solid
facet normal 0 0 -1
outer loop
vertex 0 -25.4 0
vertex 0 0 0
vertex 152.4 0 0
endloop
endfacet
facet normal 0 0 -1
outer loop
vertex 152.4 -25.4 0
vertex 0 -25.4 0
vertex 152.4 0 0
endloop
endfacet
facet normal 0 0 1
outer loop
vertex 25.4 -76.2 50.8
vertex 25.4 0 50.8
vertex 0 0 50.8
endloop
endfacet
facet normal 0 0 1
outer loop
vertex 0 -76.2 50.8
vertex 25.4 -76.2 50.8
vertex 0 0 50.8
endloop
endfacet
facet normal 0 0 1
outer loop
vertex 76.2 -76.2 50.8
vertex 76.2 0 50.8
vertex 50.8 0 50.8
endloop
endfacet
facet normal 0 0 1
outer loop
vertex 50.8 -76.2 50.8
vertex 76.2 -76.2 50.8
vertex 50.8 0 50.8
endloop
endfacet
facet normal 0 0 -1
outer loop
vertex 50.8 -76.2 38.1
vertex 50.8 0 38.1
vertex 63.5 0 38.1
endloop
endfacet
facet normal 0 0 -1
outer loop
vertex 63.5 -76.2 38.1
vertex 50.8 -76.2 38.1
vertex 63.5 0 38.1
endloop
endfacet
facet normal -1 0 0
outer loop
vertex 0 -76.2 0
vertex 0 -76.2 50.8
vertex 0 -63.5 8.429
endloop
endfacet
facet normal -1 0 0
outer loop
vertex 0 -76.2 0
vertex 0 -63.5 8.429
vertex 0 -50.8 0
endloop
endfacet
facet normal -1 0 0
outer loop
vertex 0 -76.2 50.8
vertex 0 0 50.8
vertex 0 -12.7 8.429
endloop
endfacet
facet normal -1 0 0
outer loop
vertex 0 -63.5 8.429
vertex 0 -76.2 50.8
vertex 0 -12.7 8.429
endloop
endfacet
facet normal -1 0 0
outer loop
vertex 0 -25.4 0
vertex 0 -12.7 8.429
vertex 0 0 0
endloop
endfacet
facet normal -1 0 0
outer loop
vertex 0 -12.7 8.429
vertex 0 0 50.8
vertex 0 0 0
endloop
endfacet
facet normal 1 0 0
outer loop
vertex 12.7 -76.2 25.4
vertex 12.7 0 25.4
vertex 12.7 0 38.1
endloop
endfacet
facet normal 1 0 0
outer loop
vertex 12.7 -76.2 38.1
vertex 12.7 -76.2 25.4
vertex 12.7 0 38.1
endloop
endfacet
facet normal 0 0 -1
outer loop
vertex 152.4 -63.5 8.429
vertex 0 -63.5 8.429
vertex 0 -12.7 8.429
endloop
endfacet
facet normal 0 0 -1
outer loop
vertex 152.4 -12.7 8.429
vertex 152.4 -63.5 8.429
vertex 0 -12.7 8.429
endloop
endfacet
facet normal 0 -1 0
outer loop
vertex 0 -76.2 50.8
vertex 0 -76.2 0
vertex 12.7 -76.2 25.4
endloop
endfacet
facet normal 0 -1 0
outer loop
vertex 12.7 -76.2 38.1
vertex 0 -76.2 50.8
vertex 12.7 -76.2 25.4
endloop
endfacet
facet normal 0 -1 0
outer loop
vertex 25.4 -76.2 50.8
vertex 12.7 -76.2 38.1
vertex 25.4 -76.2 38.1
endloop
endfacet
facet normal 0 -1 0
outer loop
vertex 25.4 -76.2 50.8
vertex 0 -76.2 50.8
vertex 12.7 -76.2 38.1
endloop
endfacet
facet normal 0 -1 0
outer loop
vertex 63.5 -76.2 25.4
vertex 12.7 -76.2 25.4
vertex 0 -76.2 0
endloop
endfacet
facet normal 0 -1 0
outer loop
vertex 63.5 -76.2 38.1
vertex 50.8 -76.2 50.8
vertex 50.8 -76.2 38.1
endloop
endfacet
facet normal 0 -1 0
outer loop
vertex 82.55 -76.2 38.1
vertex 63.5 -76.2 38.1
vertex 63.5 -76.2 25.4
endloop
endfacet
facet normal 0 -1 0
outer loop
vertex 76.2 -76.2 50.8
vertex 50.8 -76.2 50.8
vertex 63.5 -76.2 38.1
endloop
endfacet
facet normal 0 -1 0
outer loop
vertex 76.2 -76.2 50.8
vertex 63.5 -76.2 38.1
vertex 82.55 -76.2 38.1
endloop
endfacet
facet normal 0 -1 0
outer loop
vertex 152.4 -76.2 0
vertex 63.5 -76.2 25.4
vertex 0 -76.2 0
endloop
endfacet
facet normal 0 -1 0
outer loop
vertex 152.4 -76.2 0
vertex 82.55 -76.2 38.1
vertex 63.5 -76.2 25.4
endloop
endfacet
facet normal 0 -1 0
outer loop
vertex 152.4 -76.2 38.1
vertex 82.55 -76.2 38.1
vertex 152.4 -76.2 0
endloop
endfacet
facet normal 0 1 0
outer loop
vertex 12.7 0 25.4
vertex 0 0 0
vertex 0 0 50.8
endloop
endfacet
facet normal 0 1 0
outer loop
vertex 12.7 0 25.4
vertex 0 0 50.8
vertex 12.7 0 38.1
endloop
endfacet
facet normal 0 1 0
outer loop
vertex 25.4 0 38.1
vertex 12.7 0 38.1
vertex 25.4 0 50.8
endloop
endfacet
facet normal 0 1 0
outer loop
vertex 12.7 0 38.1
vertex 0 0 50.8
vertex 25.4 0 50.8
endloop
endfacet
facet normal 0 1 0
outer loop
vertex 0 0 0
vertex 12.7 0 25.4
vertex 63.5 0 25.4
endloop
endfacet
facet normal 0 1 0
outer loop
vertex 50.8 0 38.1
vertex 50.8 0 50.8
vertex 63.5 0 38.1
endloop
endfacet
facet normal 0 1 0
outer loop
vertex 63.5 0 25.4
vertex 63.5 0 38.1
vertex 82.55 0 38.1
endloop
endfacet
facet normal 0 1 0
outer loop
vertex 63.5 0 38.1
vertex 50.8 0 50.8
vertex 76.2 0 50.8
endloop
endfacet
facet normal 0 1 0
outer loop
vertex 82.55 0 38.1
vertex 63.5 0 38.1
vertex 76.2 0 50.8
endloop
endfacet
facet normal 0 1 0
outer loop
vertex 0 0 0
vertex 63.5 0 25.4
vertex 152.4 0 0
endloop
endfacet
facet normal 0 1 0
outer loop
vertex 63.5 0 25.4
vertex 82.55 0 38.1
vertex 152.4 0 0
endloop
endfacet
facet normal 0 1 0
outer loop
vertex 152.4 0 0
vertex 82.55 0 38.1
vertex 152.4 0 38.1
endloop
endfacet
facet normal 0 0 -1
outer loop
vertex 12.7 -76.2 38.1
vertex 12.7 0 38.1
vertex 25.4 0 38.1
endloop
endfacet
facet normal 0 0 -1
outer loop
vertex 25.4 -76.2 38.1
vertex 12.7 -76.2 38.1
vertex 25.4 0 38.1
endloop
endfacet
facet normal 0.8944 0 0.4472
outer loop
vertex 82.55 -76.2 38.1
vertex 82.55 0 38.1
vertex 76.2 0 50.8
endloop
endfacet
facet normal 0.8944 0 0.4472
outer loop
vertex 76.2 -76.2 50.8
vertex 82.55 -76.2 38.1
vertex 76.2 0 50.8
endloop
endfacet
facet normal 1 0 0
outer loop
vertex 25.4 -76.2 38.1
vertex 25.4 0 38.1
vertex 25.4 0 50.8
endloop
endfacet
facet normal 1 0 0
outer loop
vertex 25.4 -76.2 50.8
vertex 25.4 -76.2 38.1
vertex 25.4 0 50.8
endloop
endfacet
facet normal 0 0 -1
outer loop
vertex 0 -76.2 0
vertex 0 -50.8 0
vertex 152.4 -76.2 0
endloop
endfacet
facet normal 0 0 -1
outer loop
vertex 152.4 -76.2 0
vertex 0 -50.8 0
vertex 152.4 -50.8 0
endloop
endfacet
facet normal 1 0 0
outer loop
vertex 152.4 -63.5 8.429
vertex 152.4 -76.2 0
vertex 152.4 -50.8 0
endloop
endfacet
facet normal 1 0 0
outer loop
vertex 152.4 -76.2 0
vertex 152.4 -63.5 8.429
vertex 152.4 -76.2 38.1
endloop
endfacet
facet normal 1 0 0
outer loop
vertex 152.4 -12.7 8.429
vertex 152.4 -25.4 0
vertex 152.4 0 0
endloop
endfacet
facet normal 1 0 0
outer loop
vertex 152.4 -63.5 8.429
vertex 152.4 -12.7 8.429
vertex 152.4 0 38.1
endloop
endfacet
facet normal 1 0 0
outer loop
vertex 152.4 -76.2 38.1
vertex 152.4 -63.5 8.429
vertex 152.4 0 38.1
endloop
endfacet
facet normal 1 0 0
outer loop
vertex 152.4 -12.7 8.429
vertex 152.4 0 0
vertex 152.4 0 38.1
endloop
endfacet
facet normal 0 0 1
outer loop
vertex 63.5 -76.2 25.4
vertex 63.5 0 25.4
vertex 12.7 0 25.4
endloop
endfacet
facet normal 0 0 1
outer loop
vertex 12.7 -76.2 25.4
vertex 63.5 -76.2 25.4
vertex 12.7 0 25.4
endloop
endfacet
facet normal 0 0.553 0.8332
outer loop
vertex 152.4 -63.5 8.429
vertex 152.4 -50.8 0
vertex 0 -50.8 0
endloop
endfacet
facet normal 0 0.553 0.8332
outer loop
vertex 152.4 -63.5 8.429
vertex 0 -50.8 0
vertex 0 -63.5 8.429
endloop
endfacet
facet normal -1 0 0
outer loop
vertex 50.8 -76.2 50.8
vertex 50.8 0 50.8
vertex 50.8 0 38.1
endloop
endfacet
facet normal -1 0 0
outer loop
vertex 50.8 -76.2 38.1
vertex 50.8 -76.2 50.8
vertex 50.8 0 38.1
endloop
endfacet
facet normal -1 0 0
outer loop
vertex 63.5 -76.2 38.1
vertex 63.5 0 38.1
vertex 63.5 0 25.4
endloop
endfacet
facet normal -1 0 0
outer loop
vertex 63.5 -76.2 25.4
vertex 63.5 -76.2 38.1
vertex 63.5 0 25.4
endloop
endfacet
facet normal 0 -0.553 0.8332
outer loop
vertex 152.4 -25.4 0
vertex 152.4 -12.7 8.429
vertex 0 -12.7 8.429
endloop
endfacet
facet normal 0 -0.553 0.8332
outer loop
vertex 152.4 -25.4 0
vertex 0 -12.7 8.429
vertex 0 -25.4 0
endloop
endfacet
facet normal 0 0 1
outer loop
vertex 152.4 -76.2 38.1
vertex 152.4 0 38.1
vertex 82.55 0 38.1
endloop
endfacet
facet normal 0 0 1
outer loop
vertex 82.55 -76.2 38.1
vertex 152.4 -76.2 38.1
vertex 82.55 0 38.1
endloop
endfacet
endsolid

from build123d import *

# Parameters (mm, degrees)
F1_DEPTH = 76.2
F4_DEPTH = 187.96


with BuildPart() as f1:
    # F0 (on Front) → F1 (new body)
    with BuildSketch(Plane.XZ):
        Polygon((0, 50.8), (0, 0), (152.4, 0), (152.4, 38.1), (82.55, 38.1), (76.2, 50.8), (50.8, 50.8), (50.8, 38.1), (63.5, 38.1), (63.5, 25.4), (12.7, 25.4), (12.7, 38.1), (25.4, 38.1), (25.4, 50.8), align=None)
    extrude(amount=F1_DEPTH)

    # F3 (on offset) → F4 (cut)
    with BuildSketch(Plane(origin=(-25.4, 0, 0), x_dir=(0, -1, 0), z_dir=(-1, 0, 0))):
        Polygon((63.5, 8.429470472), (12.7, 8.429470472), (25.4, 0), (50.8, 0), align=None)
    extrude(amount=-F4_DEPTH, mode=Mode.SUBTRACT)


solid = f1.part
